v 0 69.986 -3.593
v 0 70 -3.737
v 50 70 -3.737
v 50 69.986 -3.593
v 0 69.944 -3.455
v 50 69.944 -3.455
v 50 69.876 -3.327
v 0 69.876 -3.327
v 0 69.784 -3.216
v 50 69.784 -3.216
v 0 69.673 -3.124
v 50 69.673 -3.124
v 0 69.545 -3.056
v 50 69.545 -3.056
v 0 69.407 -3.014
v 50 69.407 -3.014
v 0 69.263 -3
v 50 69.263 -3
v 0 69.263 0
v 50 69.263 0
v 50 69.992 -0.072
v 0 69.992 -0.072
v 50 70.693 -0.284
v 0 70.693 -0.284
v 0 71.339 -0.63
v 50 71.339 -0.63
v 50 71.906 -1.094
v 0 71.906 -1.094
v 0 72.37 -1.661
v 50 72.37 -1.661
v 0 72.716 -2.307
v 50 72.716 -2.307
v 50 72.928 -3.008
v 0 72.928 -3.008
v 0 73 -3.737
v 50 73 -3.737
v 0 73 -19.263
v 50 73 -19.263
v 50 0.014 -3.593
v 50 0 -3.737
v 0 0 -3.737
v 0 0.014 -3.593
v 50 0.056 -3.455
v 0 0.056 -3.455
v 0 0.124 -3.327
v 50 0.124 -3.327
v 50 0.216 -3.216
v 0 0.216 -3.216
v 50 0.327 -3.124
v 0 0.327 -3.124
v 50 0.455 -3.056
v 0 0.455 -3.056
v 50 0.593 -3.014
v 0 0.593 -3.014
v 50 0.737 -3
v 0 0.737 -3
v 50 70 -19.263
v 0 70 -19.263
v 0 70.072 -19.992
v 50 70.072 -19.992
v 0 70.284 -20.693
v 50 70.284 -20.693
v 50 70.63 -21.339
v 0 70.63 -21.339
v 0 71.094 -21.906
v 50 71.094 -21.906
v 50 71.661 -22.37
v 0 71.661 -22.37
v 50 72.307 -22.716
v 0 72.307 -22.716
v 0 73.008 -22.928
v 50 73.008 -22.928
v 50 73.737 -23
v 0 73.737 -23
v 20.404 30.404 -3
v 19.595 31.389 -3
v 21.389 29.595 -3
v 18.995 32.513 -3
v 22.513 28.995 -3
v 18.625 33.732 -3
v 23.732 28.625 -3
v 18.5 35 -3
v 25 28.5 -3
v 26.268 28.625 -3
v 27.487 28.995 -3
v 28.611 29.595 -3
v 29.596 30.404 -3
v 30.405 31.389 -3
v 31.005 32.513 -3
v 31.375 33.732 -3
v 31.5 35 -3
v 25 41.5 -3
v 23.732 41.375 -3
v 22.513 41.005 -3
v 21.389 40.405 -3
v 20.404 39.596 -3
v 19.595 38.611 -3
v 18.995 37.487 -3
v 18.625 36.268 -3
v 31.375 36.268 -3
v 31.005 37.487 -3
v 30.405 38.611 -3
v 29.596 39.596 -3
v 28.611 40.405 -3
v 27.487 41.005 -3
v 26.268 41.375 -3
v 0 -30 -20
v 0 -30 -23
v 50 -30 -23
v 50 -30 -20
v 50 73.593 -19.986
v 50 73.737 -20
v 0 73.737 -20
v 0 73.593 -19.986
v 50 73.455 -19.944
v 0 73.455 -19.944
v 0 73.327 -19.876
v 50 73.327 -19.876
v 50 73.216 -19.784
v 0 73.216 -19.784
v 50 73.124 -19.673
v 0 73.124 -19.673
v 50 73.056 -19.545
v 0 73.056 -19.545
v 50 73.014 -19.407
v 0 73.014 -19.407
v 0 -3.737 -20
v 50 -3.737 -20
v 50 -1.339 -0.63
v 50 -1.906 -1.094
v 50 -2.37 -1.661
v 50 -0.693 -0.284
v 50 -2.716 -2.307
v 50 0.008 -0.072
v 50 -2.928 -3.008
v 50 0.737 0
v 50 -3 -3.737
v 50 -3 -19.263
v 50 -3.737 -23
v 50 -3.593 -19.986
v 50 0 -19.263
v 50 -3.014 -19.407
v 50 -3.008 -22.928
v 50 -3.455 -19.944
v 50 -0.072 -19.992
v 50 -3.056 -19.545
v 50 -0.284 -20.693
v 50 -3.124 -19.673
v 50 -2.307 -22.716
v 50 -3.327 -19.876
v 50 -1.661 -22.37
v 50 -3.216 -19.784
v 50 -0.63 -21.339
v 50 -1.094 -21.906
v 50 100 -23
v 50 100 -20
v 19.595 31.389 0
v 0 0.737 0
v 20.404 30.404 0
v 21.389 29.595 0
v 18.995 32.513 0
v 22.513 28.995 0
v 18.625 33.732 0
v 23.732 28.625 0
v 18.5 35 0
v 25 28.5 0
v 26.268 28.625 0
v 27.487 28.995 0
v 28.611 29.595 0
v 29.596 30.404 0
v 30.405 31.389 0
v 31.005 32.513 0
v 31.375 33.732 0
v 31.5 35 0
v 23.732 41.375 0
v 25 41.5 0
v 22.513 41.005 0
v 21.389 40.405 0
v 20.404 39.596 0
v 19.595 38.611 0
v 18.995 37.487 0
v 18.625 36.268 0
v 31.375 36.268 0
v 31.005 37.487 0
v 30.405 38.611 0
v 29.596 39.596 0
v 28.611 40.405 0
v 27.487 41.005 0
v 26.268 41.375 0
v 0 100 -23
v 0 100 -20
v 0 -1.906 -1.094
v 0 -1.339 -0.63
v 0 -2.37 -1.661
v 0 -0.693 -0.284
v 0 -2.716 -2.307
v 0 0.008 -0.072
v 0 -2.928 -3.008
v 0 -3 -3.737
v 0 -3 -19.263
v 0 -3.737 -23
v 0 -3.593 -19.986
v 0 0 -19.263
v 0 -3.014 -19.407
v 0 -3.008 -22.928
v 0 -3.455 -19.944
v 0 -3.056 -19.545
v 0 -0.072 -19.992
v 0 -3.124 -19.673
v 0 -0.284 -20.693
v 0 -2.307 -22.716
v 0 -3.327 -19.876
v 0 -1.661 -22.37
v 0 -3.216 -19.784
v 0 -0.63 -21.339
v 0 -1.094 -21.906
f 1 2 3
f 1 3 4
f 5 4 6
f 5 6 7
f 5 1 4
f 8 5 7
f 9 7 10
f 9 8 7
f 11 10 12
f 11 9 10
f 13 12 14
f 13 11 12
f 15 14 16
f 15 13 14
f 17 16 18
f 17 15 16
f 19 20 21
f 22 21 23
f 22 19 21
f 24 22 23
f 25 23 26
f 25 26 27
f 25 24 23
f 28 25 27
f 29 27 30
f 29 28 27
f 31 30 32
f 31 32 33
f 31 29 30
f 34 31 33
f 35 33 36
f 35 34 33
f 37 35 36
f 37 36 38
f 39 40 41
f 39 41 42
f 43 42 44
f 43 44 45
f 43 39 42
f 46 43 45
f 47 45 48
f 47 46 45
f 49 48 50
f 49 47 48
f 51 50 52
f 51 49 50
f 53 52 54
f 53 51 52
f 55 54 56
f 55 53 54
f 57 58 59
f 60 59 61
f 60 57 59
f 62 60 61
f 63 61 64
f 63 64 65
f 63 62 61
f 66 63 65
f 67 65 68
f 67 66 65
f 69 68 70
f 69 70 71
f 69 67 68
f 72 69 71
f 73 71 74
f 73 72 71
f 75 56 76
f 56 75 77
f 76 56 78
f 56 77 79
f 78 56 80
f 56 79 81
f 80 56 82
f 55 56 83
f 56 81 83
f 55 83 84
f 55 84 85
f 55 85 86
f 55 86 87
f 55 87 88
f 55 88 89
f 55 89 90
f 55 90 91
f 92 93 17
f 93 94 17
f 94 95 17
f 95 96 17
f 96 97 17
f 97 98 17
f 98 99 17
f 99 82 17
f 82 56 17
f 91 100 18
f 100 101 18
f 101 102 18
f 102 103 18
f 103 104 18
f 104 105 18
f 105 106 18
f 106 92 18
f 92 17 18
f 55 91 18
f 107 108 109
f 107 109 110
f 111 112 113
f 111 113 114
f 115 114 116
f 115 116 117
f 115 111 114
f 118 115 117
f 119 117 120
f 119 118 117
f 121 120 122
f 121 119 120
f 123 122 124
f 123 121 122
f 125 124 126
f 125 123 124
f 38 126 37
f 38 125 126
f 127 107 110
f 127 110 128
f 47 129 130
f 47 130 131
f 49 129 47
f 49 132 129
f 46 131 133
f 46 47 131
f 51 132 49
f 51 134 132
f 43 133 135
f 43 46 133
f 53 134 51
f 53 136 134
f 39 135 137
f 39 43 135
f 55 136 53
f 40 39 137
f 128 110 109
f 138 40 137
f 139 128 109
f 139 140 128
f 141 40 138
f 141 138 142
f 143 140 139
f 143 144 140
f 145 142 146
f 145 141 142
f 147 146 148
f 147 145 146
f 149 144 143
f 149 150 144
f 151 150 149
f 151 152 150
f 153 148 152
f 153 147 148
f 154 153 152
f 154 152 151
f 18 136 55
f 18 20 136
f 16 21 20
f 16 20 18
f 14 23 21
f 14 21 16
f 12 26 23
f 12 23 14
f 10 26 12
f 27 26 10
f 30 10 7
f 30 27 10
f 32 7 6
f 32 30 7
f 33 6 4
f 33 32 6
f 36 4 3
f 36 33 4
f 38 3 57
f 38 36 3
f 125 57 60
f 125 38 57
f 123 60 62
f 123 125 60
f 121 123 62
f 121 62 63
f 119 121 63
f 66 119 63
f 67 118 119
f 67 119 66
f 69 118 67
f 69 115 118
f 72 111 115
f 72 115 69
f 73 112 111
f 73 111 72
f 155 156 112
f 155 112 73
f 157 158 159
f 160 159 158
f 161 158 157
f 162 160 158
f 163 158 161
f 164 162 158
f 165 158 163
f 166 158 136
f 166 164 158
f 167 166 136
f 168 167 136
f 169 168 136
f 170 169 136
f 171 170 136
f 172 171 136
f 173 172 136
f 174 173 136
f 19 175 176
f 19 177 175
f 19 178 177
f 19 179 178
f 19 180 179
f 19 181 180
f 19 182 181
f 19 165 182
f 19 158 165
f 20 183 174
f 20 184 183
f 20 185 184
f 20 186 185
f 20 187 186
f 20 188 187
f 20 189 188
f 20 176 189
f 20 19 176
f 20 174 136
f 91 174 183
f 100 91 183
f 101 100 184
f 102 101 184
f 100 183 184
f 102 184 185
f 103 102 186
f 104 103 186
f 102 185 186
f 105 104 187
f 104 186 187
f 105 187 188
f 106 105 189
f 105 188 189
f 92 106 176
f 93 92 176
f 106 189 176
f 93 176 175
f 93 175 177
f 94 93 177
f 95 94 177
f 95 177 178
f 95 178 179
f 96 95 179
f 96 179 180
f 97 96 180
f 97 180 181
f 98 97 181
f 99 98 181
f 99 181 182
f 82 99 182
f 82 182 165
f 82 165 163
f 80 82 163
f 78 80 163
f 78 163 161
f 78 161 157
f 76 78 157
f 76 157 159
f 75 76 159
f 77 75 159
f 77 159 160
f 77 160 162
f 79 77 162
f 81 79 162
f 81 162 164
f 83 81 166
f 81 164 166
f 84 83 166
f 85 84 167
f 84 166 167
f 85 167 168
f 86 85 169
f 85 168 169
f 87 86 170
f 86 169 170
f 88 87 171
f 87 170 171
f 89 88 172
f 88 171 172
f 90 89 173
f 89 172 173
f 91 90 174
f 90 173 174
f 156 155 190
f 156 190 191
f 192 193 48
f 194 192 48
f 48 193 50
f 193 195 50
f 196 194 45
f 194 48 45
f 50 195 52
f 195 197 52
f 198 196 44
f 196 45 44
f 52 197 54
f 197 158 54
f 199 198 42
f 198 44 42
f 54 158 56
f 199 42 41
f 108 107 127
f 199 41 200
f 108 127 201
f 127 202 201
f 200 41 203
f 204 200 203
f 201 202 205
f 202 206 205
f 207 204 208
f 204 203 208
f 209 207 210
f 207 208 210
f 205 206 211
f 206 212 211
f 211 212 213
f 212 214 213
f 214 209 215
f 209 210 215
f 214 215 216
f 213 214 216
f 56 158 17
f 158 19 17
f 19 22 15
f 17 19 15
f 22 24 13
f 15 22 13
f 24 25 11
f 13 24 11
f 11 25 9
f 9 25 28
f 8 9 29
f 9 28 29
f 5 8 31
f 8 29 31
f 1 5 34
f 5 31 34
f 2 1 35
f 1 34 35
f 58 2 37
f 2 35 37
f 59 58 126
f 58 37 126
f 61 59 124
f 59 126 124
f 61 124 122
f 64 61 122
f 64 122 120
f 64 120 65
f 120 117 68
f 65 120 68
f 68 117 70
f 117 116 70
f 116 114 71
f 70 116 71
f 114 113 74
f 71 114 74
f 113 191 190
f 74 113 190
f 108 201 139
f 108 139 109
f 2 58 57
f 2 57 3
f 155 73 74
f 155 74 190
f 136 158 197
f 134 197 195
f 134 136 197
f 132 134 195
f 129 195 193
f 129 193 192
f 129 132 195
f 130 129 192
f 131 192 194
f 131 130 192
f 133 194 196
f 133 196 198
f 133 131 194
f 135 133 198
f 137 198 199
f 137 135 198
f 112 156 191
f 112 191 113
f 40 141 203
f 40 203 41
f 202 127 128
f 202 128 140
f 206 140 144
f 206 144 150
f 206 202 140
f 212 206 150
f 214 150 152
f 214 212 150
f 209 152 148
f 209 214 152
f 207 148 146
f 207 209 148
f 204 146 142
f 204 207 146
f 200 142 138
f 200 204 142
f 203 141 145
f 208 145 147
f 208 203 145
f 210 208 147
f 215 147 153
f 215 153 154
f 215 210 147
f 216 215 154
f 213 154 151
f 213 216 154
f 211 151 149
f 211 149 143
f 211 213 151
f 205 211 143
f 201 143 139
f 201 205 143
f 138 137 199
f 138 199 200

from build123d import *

# Parameters (mm, degrees)
SKETCH_1_W                         = 50
SKETCH_1_H                         = 70
SM_BASE_FLANGE_1_DEPTH             = 3
SM_EDGE_FLANGE_1_STRIP_W           = 13.4732
SM_EDGE_FLANGE_1_STRIP_H           = 3
SM_EDGE_FLANGE_1_STRIP_CUT_DEPTH   = 50
SM_EDGE_FLANGE_1_STRIP_2_W         = 13.4732
SM_EDGE_FLANGE_1_STRIP_2_H         = 3
SM_EDGE_FLANGE_1_STRIP_CUT_2_DEPTH = 50
SM_EDGE_FLANGE_1_DEPTH             = 50
SM_EDGE_FLANGE_1_BEND_DEPTH        = 50
SM_EDGE_FLANGE_2_STRIP_W           = 13.4732
SM_EDGE_FLANGE_2_STRIP_H           = 3
SM_EDGE_FLANGE_2_STRIP_CUT_DEPTH   = 50
SM_EDGE_FLANGE_2_STRIP_2_W         = 13.4732
SM_EDGE_FLANGE_2_STRIP_2_H         = 3
SM_EDGE_FLANGE_2_STRIP_CUT_2_DEPTH = 50
SM_EDGE_FLANGE_2_DEPTH             = 50
SM_EDGE_FLANGE_2_BEND_DEPTH        = 50
SKETCH_18_R                        = 6.5
CUT_EXTRUDE_1_DEPTH                = 115.144645078


# Sheet-metal steps are written as plain solids
with BuildPart() as part:
    # Sketch 1 → 基体-法兰1 (new body)
    with BuildSketch(Plane.XY):
        with Locations((25, 35)):
            Rectangle(SKETCH_1_W, SKETCH_1_H)
    extrude(amount=-SM_BASE_FLANGE_1_DEPTH)

    # 边线-法兰1 strip (across the edge) → 边线-法兰1 strip cut (cut)
    with BuildSketch(Plane(origin=(0, 70, -3), x_dir=(0, -1, 0), z_dir=(1, 0, 0))):
        with Locations((-6, -1.5)):
            Rectangle(SM_EDGE_FLANGE_1_STRIP_W, SM_EDGE_FLANGE_1_STRIP_H)
    extrude(amount=SM_EDGE_FLANGE_1_STRIP_CUT_DEPTH, mode=Mode.SUBTRACT)

    # 边线-法兰1 strip 2 (across the edge) → 边线-法兰1 strip cut 2 (cut)
    with BuildSketch(Plane(origin=(50, 0, -3), x_dir=(0, 1, 0), z_dir=(-1, 0, 0))):
        with Locations((-6, -1.5)):
            Rectangle(SM_EDGE_FLANGE_1_STRIP_2_W, SM_EDGE_FLANGE_1_STRIP_2_H)
    extrude(amount=SM_EDGE_FLANGE_1_STRIP_CUT_2_DEPTH, mode=Mode.SUBTRACT)

    # 边线-法兰1 section (across the edge) → 边线-法兰1 (add)
    with BuildSketch(Plane(origin=(0, 70, -3), x_dir=(0, -1, 0), z_dir=(1, 0, 0))):
        with BuildLine():
            Line((-3, 0.7366), (-3, 17))
            Line((-3, 17), (0, 17))
            Line((0, 17), (0, 0.7366))
            ThreePointArc((0, 0.7366), (0.215745145, 0.215745145), (0.7366, 0))
            Line((0.7366, 0), (0.7366, -3))
            ThreePointArc((0.7366, -3), (-1.905575199, -1.905575199), (-3, 0.7366))
        make_face()
    extrude(amount=SM_EDGE_FLANGE_1_DEPTH)

    # 边线-法兰1 section 2 (across the edge) → 边线-法兰1 bend (add)
    with BuildSketch(Plane(origin=(50, 0, -3), x_dir=(0, 1, 0), z_dir=(-1, 0, 0))):
        with BuildLine():
            Line((-3, 0.7366), (-3, 17))
            Line((-3, 17), (0, 17))
            Line((0, 17), (0, 0.7366))
            ThreePointArc((0, 0.7366), (0.215745145, 0.215745145), (0.7366, 0))
            Line((0.7366, 0), (0.7366, -3))
            ThreePointArc((0.7366, -3), (-1.905575199, -1.905575199), (-3, 0.7366))
        make_face()
    extrude(amount=SM_EDGE_FLANGE_1_BEND_DEPTH)

    # 边线-法兰2 strip (across the edge) → 边线-法兰2 strip cut (cut)
    with BuildSketch(Plane(origin=(0, -3, -20), x_dir=(0, 0, 1), z_dir=(1, 0, 0))):
        with Locations((-6, -1.5)):
            Rectangle(SM_EDGE_FLANGE_2_STRIP_W, SM_EDGE_FLANGE_2_STRIP_H)
    extrude(amount=SM_EDGE_FLANGE_2_STRIP_CUT_DEPTH, mode=Mode.SUBTRACT)

    # 边线-法兰2 strip 2 (across the edge) → 边线-法兰2 strip cut 2 (cut)
    with BuildSketch(Plane(origin=(50, 73, -20), x_dir=(0, 0, 1), z_dir=(-1, 0, 0))):
        with Locations((-6, -1.5)):
            Rectangle(SM_EDGE_FLANGE_2_STRIP_2_W, SM_EDGE_FLANGE_2_STRIP_2_H)
    extrude(amount=SM_EDGE_FLANGE_2_STRIP_CUT_2_DEPTH, mode=Mode.SUBTRACT)

    # 边线-法兰2 section (across the edge) → 边线-法兰2 (add)
    with BuildSketch(Plane(origin=(0, -3, -20), x_dir=(0, 0, 1), z_dir=(1, 0, 0))):
        with BuildLine():
            Line((-3, 0.7366), (-3, 27))
            Line((-3, 27), (0, 27))
            Line((0, 27), (0, 0.7366))
            ThreePointArc((0, 0.7366), (0.215745145, 0.215745145), (0.7366, 0))
            Line((0.7366, 0), (0.7366, -3))
            ThreePointArc((0.7366, -3), (-1.905575199, -1.905575199), (-3, 0.7366))
        make_face()
    extrude(amount=SM_EDGE_FLANGE_2_DEPTH)

    # 边线-法兰2 section 2 (across the edge) → 边线-法兰2 bend (add)
    with BuildSketch(Plane(origin=(50, 73, -20), x_dir=(0, 0, 1), z_dir=(-1, 0, 0))):
        with BuildLine():
            Line((-3, 0.7366), (-3, 27))
            Line((-3, 27), (0, 27))
            Line((0, 27), (0, 0.7366))
            ThreePointArc((0, 0.7366), (0.215745145, 0.215745145), (0.7366, 0))
            Line((0.7366, 0), (0.7366, -3))
            ThreePointArc((0.7366, -3), (-1.905575199, -1.905575199), (-3, 0.7366))
        make_face()
    extrude(amount=SM_EDGE_FLANGE_2_BEND_DEPTH)

    # 草图18 → 切除-拉伸1 (cut, through all)
    with BuildSketch(Plane.XY):
        with Locations((25, 35)):
            Circle(SKETCH_18_R)
    extrude(amount=-CUT_EXTRUDE_1_DEPTH, mode=Mode.SUBTRACT)


solid = part.part
